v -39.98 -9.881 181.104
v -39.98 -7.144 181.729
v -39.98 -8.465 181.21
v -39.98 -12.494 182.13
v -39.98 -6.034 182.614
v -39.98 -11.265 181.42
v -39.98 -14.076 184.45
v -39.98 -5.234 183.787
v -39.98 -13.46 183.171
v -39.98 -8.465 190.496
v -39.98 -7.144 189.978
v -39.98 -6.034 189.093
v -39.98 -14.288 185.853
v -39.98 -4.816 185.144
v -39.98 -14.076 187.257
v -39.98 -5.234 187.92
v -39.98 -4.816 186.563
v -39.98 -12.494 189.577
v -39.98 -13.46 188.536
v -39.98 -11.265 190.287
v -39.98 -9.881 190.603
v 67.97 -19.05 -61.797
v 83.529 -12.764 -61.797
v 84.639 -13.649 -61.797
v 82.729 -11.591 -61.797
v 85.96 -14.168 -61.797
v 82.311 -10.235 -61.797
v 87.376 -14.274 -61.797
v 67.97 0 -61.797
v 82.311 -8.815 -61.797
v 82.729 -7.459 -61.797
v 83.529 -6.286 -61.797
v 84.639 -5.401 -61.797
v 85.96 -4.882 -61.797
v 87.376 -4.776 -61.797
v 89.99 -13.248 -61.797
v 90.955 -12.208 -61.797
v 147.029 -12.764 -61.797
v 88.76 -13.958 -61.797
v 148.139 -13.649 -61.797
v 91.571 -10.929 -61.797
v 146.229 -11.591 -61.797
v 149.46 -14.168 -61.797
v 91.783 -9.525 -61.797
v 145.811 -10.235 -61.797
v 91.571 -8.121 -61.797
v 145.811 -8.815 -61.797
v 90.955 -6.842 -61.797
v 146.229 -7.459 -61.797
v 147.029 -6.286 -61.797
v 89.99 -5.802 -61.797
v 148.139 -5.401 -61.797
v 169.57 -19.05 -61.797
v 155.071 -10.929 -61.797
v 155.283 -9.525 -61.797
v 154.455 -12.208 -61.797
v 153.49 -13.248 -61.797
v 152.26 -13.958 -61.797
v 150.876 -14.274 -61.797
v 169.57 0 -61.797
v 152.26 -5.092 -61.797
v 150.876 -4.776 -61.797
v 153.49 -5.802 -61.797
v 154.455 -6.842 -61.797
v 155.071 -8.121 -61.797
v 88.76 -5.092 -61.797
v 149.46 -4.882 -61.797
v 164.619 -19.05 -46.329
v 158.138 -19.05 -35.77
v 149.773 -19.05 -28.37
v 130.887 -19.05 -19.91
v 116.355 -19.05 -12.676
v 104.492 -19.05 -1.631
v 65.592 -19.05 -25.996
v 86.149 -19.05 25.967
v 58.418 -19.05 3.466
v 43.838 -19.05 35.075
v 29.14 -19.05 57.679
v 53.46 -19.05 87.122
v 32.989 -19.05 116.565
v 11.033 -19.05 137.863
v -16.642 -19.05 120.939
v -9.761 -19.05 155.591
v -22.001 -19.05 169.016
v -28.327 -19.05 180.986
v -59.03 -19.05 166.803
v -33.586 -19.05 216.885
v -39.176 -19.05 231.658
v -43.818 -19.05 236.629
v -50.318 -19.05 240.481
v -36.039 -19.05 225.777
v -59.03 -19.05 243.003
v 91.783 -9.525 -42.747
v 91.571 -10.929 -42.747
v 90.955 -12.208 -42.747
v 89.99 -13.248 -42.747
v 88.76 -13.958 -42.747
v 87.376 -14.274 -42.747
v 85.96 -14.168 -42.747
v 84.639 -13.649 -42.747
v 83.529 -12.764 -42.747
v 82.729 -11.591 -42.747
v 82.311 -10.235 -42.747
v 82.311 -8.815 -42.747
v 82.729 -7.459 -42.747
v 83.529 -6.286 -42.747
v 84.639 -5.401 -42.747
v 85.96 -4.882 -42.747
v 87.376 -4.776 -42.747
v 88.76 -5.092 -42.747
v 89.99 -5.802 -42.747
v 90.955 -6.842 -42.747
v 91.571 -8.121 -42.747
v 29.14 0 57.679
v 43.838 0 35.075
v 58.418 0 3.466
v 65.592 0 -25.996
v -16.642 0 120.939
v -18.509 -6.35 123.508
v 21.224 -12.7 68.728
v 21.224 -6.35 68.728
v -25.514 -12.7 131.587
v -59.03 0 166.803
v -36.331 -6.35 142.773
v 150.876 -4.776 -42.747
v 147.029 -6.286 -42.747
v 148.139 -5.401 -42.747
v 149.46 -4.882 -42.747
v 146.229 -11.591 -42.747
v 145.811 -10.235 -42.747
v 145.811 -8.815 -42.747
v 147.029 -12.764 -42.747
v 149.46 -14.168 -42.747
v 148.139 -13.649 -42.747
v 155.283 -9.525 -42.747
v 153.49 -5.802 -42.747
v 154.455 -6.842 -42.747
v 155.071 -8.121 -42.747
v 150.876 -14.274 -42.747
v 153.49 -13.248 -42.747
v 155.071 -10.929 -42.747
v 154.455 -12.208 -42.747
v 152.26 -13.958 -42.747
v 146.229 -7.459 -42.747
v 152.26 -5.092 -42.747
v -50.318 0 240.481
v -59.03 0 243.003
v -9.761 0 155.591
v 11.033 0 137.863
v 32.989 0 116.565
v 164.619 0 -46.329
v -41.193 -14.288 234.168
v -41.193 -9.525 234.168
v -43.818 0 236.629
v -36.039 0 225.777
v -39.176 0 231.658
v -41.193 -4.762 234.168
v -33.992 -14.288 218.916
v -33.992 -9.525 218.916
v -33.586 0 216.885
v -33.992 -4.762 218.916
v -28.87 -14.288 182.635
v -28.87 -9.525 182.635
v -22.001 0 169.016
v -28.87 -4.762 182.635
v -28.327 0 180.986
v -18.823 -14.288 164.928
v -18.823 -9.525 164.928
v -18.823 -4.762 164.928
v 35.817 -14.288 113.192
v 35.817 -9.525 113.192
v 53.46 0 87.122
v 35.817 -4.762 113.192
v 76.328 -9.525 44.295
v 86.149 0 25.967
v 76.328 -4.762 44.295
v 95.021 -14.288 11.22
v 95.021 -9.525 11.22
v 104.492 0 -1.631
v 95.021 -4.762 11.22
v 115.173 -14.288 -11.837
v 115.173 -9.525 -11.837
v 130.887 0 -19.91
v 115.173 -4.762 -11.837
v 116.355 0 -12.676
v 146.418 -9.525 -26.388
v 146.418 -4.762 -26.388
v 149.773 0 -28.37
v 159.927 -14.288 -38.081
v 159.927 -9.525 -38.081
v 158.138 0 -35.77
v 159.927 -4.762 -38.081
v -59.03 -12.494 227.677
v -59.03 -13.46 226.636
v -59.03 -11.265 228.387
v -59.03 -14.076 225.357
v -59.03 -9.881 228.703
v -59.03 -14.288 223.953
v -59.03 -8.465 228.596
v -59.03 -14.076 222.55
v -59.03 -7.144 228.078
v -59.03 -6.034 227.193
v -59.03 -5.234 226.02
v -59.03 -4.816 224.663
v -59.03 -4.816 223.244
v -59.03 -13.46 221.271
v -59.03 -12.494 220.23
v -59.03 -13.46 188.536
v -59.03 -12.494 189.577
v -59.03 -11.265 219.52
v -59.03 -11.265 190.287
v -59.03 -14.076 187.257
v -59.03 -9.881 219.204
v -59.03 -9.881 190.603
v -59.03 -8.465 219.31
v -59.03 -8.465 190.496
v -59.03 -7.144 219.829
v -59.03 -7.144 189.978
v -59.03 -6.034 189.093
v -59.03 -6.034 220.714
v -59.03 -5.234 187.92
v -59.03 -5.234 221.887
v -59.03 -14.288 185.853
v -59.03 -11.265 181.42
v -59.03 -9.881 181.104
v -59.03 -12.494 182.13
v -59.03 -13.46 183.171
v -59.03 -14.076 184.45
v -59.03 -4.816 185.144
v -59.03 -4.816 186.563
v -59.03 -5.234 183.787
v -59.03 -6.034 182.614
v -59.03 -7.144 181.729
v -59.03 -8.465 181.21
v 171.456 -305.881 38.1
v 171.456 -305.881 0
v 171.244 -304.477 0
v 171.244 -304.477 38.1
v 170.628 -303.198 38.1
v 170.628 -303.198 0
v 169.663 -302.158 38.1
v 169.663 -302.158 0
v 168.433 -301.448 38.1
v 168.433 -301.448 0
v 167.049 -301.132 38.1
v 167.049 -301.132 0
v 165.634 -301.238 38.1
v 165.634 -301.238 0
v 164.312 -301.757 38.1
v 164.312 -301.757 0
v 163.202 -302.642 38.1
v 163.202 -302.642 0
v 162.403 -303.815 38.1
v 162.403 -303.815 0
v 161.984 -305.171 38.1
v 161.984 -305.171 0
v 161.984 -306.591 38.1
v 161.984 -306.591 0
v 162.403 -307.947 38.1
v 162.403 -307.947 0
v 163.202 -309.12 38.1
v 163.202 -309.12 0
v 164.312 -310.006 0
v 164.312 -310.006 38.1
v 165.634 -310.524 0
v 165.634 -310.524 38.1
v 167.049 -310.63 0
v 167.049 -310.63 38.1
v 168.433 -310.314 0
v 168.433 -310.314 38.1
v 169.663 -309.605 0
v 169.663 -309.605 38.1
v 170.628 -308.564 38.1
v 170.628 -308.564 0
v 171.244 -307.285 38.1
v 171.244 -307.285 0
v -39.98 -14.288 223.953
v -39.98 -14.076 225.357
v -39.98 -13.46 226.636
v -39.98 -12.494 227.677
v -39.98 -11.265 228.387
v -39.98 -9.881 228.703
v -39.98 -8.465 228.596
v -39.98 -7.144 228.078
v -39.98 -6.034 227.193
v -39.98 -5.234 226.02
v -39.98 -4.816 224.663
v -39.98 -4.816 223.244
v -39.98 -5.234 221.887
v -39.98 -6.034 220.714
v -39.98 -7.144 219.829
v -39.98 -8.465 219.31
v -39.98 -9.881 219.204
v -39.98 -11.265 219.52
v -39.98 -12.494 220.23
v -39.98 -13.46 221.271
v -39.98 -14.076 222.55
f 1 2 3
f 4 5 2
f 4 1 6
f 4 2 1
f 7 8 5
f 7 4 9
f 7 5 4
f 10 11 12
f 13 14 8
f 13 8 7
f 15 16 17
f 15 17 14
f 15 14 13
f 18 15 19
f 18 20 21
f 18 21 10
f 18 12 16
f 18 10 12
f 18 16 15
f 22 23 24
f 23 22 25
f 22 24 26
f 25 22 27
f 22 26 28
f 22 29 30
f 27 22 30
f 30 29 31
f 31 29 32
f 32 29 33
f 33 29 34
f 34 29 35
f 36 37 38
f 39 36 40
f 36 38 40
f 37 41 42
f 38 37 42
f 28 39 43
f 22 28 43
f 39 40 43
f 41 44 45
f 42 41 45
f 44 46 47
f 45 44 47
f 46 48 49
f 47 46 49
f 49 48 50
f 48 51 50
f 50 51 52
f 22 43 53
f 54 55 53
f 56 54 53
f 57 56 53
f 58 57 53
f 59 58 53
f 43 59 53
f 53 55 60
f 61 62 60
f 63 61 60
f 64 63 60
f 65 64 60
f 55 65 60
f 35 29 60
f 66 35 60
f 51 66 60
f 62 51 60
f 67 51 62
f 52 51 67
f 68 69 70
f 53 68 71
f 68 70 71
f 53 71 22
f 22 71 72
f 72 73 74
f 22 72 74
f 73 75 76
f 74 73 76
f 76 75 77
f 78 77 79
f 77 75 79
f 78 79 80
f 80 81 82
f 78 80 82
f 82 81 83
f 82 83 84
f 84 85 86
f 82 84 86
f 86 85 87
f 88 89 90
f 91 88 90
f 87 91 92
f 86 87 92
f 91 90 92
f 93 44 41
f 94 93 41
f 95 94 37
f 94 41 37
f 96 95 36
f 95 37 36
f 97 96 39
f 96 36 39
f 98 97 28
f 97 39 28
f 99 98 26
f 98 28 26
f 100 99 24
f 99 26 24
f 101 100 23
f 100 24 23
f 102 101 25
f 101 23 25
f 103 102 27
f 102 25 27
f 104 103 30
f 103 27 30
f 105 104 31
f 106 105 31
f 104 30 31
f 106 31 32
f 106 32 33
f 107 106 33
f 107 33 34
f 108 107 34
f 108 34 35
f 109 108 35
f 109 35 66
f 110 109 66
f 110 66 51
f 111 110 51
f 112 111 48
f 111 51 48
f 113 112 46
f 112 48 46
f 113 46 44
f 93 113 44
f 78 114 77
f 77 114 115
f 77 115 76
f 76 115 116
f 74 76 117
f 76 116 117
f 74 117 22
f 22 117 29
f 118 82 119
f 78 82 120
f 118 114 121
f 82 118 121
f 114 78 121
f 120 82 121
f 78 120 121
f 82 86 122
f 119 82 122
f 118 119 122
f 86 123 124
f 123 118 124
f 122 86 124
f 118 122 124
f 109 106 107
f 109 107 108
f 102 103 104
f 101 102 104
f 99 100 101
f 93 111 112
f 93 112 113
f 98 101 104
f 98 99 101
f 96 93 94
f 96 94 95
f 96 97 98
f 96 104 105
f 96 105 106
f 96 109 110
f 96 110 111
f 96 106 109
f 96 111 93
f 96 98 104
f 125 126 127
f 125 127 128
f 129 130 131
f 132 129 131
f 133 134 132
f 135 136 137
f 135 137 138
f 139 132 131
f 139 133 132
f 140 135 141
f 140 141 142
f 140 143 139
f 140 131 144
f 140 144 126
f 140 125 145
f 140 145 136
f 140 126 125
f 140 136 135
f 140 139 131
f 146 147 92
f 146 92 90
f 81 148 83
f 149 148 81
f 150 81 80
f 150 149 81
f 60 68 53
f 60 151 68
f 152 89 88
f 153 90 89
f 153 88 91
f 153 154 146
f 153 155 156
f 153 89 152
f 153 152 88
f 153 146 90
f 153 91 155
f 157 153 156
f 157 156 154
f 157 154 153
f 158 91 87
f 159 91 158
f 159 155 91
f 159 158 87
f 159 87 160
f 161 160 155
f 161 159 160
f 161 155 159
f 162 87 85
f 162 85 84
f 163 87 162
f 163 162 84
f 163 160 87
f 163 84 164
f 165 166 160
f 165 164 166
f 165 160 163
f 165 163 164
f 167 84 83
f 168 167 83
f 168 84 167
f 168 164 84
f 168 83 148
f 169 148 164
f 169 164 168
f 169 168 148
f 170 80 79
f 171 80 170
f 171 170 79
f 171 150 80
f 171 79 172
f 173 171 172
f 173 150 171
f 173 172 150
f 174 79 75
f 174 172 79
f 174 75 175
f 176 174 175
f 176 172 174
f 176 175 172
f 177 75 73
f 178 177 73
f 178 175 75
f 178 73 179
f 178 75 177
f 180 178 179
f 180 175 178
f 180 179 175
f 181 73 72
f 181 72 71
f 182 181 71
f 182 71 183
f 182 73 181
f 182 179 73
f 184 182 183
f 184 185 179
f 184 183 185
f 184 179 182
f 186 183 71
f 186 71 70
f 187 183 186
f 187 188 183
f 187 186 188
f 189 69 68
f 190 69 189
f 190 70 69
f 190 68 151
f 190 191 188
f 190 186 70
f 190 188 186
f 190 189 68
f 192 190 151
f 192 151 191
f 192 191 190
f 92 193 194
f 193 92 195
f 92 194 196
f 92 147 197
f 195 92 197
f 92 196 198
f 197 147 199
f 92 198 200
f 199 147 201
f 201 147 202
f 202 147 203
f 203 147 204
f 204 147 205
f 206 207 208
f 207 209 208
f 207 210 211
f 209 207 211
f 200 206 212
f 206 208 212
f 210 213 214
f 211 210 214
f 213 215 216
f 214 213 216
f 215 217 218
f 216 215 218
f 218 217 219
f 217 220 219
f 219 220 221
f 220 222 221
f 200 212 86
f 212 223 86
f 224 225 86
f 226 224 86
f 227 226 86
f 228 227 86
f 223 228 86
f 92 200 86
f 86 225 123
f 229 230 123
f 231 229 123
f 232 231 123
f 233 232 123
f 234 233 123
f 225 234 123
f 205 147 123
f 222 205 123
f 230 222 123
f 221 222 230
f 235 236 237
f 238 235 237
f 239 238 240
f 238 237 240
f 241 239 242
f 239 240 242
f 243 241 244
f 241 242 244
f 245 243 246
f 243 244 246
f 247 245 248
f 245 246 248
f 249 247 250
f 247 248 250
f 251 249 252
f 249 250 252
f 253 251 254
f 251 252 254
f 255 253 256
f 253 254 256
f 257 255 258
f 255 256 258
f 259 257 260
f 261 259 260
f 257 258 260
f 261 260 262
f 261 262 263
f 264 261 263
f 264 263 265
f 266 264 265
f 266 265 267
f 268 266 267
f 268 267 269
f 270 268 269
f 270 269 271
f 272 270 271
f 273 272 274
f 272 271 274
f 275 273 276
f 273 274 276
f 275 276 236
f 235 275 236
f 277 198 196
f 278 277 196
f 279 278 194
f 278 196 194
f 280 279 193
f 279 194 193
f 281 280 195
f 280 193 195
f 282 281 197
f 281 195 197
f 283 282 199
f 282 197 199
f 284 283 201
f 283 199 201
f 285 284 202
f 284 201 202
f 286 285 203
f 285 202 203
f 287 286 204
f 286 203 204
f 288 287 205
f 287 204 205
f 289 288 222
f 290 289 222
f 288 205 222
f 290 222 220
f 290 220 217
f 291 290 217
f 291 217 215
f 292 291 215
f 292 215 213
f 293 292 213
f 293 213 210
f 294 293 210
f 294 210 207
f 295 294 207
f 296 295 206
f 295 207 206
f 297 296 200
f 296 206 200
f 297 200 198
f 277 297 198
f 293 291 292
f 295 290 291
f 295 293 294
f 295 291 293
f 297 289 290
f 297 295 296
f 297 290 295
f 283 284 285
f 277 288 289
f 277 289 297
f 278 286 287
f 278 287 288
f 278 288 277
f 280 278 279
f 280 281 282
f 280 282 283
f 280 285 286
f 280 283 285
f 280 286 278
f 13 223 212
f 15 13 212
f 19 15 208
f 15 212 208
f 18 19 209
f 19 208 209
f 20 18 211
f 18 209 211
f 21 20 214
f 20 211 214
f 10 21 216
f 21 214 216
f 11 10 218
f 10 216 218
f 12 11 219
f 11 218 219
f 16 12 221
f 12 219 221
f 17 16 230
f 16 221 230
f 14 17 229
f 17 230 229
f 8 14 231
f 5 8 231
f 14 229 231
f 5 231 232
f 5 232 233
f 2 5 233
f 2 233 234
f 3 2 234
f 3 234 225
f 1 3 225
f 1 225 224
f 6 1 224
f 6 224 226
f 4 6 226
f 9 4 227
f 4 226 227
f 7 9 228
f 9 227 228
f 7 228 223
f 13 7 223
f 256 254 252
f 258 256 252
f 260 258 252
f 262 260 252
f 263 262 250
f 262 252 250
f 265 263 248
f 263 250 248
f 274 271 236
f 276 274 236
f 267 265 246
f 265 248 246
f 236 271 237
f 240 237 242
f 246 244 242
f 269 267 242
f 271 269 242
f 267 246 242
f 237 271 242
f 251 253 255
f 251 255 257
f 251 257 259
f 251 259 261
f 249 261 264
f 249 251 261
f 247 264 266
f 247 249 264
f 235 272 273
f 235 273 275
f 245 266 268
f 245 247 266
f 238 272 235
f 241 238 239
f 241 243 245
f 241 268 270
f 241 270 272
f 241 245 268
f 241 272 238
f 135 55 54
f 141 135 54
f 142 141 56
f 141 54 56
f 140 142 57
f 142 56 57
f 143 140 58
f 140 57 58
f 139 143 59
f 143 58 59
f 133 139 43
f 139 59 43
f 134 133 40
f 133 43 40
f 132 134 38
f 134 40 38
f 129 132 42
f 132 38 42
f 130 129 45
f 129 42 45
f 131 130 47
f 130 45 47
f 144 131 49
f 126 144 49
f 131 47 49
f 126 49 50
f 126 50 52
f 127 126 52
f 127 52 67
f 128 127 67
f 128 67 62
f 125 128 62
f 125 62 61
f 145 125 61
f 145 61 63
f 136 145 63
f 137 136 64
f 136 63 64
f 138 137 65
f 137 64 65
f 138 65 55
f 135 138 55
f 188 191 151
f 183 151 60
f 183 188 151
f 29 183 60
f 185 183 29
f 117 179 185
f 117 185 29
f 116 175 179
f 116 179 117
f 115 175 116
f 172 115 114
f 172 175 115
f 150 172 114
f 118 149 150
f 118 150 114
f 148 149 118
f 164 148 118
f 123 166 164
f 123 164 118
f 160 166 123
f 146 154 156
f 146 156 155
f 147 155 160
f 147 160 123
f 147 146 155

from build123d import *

# Parameters (mm, degrees)
F2_DEPTH = 19.05
F3_R     = 4.7625
F4_DEPTH = 19.05
F5_R     = 4.7625
F6_DEPTH = 19.05
F7_R     = 4.7625
F8_DEPTH = 38.1


with BuildPart() as f2:
    # F1 (on Front) → F2 (new body)
    with BuildSketch(Plane.XZ):
        with BuildLine():
            add(Edge.make_bspline(
                [(-59.029830877, 243.003362101), (-25.6430901, 236.9973734133), (-47.6286333903, 166.8370381779), (50.8732357185, 127.9388190534), (100.4707793595, -37.3836970074), (160.1090798011, -19.1354067202), (169.570169123, -61.796637899)],
                knots=[0, 0, 0, 0, 0.2121606947, 0.4637595102, 0.778045013, 1, 1, 1, 1], degree=3))
            Line((-59.029830877, 243.003362101), (-59.029830877, 166.803362101))
            add(Edge.make_bspline(
                [(-59.029830877, 166.803362101), (-18.5094550252, 123.5082000494), (-29.2048099449, 138.2164911571), (29.1424137517, 57.9771762488), (68.6394424497, 2.8390802152), (67.970169123, -61.796637899)],
                knots=[0, 0, 0, 0, 0.2779833625, 0.5749454845, 1, 1, 1, 1], degree=3))
            Line((67.970169123, -61.796637899), (169.570169123, -61.796637899))
        make_face()
    extrude(amount=F2_DEPTH)

    # F3 (on face) → F4 (cut)
    with BuildSketch(Plane(origin=(-59.029830877, 0, 0), x_dir=(0, -1, 0), z_dir=(-1, 0, 0))):
        with Locations((9.525, 223.953362101)):
            Circle(F3_R)
        with Locations((9.525, 185.853362101)):
            Circle(F3_R)
    extrude(amount=-F4_DEPTH, mode=Mode.SUBTRACT)

    # F5 (on face) → F6 (cut)
    with BuildSketch(Plane(origin=(0, 0, -61.796637899), x_dir=(1, 0, 0), z_dir=(0, 0, -1))):
        with Locations((150.520169123, 9.525)):
            Circle(F5_R)
        with Locations((87.020169123, 9.525)):
            Circle(F5_R)
    extrude(amount=-F6_DEPTH, mode=Mode.SUBTRACT)


with BuildPart() as f8:
    # F7 (on Top) → F8 (new body)
    with BuildSketch(Plane.XY):
        with Locations((166.6935235262, -305.8810830116)):
            Circle(F7_R)
    extrude(amount=F8_DEPTH)


solid = Compound([f2.part, f8.part])
